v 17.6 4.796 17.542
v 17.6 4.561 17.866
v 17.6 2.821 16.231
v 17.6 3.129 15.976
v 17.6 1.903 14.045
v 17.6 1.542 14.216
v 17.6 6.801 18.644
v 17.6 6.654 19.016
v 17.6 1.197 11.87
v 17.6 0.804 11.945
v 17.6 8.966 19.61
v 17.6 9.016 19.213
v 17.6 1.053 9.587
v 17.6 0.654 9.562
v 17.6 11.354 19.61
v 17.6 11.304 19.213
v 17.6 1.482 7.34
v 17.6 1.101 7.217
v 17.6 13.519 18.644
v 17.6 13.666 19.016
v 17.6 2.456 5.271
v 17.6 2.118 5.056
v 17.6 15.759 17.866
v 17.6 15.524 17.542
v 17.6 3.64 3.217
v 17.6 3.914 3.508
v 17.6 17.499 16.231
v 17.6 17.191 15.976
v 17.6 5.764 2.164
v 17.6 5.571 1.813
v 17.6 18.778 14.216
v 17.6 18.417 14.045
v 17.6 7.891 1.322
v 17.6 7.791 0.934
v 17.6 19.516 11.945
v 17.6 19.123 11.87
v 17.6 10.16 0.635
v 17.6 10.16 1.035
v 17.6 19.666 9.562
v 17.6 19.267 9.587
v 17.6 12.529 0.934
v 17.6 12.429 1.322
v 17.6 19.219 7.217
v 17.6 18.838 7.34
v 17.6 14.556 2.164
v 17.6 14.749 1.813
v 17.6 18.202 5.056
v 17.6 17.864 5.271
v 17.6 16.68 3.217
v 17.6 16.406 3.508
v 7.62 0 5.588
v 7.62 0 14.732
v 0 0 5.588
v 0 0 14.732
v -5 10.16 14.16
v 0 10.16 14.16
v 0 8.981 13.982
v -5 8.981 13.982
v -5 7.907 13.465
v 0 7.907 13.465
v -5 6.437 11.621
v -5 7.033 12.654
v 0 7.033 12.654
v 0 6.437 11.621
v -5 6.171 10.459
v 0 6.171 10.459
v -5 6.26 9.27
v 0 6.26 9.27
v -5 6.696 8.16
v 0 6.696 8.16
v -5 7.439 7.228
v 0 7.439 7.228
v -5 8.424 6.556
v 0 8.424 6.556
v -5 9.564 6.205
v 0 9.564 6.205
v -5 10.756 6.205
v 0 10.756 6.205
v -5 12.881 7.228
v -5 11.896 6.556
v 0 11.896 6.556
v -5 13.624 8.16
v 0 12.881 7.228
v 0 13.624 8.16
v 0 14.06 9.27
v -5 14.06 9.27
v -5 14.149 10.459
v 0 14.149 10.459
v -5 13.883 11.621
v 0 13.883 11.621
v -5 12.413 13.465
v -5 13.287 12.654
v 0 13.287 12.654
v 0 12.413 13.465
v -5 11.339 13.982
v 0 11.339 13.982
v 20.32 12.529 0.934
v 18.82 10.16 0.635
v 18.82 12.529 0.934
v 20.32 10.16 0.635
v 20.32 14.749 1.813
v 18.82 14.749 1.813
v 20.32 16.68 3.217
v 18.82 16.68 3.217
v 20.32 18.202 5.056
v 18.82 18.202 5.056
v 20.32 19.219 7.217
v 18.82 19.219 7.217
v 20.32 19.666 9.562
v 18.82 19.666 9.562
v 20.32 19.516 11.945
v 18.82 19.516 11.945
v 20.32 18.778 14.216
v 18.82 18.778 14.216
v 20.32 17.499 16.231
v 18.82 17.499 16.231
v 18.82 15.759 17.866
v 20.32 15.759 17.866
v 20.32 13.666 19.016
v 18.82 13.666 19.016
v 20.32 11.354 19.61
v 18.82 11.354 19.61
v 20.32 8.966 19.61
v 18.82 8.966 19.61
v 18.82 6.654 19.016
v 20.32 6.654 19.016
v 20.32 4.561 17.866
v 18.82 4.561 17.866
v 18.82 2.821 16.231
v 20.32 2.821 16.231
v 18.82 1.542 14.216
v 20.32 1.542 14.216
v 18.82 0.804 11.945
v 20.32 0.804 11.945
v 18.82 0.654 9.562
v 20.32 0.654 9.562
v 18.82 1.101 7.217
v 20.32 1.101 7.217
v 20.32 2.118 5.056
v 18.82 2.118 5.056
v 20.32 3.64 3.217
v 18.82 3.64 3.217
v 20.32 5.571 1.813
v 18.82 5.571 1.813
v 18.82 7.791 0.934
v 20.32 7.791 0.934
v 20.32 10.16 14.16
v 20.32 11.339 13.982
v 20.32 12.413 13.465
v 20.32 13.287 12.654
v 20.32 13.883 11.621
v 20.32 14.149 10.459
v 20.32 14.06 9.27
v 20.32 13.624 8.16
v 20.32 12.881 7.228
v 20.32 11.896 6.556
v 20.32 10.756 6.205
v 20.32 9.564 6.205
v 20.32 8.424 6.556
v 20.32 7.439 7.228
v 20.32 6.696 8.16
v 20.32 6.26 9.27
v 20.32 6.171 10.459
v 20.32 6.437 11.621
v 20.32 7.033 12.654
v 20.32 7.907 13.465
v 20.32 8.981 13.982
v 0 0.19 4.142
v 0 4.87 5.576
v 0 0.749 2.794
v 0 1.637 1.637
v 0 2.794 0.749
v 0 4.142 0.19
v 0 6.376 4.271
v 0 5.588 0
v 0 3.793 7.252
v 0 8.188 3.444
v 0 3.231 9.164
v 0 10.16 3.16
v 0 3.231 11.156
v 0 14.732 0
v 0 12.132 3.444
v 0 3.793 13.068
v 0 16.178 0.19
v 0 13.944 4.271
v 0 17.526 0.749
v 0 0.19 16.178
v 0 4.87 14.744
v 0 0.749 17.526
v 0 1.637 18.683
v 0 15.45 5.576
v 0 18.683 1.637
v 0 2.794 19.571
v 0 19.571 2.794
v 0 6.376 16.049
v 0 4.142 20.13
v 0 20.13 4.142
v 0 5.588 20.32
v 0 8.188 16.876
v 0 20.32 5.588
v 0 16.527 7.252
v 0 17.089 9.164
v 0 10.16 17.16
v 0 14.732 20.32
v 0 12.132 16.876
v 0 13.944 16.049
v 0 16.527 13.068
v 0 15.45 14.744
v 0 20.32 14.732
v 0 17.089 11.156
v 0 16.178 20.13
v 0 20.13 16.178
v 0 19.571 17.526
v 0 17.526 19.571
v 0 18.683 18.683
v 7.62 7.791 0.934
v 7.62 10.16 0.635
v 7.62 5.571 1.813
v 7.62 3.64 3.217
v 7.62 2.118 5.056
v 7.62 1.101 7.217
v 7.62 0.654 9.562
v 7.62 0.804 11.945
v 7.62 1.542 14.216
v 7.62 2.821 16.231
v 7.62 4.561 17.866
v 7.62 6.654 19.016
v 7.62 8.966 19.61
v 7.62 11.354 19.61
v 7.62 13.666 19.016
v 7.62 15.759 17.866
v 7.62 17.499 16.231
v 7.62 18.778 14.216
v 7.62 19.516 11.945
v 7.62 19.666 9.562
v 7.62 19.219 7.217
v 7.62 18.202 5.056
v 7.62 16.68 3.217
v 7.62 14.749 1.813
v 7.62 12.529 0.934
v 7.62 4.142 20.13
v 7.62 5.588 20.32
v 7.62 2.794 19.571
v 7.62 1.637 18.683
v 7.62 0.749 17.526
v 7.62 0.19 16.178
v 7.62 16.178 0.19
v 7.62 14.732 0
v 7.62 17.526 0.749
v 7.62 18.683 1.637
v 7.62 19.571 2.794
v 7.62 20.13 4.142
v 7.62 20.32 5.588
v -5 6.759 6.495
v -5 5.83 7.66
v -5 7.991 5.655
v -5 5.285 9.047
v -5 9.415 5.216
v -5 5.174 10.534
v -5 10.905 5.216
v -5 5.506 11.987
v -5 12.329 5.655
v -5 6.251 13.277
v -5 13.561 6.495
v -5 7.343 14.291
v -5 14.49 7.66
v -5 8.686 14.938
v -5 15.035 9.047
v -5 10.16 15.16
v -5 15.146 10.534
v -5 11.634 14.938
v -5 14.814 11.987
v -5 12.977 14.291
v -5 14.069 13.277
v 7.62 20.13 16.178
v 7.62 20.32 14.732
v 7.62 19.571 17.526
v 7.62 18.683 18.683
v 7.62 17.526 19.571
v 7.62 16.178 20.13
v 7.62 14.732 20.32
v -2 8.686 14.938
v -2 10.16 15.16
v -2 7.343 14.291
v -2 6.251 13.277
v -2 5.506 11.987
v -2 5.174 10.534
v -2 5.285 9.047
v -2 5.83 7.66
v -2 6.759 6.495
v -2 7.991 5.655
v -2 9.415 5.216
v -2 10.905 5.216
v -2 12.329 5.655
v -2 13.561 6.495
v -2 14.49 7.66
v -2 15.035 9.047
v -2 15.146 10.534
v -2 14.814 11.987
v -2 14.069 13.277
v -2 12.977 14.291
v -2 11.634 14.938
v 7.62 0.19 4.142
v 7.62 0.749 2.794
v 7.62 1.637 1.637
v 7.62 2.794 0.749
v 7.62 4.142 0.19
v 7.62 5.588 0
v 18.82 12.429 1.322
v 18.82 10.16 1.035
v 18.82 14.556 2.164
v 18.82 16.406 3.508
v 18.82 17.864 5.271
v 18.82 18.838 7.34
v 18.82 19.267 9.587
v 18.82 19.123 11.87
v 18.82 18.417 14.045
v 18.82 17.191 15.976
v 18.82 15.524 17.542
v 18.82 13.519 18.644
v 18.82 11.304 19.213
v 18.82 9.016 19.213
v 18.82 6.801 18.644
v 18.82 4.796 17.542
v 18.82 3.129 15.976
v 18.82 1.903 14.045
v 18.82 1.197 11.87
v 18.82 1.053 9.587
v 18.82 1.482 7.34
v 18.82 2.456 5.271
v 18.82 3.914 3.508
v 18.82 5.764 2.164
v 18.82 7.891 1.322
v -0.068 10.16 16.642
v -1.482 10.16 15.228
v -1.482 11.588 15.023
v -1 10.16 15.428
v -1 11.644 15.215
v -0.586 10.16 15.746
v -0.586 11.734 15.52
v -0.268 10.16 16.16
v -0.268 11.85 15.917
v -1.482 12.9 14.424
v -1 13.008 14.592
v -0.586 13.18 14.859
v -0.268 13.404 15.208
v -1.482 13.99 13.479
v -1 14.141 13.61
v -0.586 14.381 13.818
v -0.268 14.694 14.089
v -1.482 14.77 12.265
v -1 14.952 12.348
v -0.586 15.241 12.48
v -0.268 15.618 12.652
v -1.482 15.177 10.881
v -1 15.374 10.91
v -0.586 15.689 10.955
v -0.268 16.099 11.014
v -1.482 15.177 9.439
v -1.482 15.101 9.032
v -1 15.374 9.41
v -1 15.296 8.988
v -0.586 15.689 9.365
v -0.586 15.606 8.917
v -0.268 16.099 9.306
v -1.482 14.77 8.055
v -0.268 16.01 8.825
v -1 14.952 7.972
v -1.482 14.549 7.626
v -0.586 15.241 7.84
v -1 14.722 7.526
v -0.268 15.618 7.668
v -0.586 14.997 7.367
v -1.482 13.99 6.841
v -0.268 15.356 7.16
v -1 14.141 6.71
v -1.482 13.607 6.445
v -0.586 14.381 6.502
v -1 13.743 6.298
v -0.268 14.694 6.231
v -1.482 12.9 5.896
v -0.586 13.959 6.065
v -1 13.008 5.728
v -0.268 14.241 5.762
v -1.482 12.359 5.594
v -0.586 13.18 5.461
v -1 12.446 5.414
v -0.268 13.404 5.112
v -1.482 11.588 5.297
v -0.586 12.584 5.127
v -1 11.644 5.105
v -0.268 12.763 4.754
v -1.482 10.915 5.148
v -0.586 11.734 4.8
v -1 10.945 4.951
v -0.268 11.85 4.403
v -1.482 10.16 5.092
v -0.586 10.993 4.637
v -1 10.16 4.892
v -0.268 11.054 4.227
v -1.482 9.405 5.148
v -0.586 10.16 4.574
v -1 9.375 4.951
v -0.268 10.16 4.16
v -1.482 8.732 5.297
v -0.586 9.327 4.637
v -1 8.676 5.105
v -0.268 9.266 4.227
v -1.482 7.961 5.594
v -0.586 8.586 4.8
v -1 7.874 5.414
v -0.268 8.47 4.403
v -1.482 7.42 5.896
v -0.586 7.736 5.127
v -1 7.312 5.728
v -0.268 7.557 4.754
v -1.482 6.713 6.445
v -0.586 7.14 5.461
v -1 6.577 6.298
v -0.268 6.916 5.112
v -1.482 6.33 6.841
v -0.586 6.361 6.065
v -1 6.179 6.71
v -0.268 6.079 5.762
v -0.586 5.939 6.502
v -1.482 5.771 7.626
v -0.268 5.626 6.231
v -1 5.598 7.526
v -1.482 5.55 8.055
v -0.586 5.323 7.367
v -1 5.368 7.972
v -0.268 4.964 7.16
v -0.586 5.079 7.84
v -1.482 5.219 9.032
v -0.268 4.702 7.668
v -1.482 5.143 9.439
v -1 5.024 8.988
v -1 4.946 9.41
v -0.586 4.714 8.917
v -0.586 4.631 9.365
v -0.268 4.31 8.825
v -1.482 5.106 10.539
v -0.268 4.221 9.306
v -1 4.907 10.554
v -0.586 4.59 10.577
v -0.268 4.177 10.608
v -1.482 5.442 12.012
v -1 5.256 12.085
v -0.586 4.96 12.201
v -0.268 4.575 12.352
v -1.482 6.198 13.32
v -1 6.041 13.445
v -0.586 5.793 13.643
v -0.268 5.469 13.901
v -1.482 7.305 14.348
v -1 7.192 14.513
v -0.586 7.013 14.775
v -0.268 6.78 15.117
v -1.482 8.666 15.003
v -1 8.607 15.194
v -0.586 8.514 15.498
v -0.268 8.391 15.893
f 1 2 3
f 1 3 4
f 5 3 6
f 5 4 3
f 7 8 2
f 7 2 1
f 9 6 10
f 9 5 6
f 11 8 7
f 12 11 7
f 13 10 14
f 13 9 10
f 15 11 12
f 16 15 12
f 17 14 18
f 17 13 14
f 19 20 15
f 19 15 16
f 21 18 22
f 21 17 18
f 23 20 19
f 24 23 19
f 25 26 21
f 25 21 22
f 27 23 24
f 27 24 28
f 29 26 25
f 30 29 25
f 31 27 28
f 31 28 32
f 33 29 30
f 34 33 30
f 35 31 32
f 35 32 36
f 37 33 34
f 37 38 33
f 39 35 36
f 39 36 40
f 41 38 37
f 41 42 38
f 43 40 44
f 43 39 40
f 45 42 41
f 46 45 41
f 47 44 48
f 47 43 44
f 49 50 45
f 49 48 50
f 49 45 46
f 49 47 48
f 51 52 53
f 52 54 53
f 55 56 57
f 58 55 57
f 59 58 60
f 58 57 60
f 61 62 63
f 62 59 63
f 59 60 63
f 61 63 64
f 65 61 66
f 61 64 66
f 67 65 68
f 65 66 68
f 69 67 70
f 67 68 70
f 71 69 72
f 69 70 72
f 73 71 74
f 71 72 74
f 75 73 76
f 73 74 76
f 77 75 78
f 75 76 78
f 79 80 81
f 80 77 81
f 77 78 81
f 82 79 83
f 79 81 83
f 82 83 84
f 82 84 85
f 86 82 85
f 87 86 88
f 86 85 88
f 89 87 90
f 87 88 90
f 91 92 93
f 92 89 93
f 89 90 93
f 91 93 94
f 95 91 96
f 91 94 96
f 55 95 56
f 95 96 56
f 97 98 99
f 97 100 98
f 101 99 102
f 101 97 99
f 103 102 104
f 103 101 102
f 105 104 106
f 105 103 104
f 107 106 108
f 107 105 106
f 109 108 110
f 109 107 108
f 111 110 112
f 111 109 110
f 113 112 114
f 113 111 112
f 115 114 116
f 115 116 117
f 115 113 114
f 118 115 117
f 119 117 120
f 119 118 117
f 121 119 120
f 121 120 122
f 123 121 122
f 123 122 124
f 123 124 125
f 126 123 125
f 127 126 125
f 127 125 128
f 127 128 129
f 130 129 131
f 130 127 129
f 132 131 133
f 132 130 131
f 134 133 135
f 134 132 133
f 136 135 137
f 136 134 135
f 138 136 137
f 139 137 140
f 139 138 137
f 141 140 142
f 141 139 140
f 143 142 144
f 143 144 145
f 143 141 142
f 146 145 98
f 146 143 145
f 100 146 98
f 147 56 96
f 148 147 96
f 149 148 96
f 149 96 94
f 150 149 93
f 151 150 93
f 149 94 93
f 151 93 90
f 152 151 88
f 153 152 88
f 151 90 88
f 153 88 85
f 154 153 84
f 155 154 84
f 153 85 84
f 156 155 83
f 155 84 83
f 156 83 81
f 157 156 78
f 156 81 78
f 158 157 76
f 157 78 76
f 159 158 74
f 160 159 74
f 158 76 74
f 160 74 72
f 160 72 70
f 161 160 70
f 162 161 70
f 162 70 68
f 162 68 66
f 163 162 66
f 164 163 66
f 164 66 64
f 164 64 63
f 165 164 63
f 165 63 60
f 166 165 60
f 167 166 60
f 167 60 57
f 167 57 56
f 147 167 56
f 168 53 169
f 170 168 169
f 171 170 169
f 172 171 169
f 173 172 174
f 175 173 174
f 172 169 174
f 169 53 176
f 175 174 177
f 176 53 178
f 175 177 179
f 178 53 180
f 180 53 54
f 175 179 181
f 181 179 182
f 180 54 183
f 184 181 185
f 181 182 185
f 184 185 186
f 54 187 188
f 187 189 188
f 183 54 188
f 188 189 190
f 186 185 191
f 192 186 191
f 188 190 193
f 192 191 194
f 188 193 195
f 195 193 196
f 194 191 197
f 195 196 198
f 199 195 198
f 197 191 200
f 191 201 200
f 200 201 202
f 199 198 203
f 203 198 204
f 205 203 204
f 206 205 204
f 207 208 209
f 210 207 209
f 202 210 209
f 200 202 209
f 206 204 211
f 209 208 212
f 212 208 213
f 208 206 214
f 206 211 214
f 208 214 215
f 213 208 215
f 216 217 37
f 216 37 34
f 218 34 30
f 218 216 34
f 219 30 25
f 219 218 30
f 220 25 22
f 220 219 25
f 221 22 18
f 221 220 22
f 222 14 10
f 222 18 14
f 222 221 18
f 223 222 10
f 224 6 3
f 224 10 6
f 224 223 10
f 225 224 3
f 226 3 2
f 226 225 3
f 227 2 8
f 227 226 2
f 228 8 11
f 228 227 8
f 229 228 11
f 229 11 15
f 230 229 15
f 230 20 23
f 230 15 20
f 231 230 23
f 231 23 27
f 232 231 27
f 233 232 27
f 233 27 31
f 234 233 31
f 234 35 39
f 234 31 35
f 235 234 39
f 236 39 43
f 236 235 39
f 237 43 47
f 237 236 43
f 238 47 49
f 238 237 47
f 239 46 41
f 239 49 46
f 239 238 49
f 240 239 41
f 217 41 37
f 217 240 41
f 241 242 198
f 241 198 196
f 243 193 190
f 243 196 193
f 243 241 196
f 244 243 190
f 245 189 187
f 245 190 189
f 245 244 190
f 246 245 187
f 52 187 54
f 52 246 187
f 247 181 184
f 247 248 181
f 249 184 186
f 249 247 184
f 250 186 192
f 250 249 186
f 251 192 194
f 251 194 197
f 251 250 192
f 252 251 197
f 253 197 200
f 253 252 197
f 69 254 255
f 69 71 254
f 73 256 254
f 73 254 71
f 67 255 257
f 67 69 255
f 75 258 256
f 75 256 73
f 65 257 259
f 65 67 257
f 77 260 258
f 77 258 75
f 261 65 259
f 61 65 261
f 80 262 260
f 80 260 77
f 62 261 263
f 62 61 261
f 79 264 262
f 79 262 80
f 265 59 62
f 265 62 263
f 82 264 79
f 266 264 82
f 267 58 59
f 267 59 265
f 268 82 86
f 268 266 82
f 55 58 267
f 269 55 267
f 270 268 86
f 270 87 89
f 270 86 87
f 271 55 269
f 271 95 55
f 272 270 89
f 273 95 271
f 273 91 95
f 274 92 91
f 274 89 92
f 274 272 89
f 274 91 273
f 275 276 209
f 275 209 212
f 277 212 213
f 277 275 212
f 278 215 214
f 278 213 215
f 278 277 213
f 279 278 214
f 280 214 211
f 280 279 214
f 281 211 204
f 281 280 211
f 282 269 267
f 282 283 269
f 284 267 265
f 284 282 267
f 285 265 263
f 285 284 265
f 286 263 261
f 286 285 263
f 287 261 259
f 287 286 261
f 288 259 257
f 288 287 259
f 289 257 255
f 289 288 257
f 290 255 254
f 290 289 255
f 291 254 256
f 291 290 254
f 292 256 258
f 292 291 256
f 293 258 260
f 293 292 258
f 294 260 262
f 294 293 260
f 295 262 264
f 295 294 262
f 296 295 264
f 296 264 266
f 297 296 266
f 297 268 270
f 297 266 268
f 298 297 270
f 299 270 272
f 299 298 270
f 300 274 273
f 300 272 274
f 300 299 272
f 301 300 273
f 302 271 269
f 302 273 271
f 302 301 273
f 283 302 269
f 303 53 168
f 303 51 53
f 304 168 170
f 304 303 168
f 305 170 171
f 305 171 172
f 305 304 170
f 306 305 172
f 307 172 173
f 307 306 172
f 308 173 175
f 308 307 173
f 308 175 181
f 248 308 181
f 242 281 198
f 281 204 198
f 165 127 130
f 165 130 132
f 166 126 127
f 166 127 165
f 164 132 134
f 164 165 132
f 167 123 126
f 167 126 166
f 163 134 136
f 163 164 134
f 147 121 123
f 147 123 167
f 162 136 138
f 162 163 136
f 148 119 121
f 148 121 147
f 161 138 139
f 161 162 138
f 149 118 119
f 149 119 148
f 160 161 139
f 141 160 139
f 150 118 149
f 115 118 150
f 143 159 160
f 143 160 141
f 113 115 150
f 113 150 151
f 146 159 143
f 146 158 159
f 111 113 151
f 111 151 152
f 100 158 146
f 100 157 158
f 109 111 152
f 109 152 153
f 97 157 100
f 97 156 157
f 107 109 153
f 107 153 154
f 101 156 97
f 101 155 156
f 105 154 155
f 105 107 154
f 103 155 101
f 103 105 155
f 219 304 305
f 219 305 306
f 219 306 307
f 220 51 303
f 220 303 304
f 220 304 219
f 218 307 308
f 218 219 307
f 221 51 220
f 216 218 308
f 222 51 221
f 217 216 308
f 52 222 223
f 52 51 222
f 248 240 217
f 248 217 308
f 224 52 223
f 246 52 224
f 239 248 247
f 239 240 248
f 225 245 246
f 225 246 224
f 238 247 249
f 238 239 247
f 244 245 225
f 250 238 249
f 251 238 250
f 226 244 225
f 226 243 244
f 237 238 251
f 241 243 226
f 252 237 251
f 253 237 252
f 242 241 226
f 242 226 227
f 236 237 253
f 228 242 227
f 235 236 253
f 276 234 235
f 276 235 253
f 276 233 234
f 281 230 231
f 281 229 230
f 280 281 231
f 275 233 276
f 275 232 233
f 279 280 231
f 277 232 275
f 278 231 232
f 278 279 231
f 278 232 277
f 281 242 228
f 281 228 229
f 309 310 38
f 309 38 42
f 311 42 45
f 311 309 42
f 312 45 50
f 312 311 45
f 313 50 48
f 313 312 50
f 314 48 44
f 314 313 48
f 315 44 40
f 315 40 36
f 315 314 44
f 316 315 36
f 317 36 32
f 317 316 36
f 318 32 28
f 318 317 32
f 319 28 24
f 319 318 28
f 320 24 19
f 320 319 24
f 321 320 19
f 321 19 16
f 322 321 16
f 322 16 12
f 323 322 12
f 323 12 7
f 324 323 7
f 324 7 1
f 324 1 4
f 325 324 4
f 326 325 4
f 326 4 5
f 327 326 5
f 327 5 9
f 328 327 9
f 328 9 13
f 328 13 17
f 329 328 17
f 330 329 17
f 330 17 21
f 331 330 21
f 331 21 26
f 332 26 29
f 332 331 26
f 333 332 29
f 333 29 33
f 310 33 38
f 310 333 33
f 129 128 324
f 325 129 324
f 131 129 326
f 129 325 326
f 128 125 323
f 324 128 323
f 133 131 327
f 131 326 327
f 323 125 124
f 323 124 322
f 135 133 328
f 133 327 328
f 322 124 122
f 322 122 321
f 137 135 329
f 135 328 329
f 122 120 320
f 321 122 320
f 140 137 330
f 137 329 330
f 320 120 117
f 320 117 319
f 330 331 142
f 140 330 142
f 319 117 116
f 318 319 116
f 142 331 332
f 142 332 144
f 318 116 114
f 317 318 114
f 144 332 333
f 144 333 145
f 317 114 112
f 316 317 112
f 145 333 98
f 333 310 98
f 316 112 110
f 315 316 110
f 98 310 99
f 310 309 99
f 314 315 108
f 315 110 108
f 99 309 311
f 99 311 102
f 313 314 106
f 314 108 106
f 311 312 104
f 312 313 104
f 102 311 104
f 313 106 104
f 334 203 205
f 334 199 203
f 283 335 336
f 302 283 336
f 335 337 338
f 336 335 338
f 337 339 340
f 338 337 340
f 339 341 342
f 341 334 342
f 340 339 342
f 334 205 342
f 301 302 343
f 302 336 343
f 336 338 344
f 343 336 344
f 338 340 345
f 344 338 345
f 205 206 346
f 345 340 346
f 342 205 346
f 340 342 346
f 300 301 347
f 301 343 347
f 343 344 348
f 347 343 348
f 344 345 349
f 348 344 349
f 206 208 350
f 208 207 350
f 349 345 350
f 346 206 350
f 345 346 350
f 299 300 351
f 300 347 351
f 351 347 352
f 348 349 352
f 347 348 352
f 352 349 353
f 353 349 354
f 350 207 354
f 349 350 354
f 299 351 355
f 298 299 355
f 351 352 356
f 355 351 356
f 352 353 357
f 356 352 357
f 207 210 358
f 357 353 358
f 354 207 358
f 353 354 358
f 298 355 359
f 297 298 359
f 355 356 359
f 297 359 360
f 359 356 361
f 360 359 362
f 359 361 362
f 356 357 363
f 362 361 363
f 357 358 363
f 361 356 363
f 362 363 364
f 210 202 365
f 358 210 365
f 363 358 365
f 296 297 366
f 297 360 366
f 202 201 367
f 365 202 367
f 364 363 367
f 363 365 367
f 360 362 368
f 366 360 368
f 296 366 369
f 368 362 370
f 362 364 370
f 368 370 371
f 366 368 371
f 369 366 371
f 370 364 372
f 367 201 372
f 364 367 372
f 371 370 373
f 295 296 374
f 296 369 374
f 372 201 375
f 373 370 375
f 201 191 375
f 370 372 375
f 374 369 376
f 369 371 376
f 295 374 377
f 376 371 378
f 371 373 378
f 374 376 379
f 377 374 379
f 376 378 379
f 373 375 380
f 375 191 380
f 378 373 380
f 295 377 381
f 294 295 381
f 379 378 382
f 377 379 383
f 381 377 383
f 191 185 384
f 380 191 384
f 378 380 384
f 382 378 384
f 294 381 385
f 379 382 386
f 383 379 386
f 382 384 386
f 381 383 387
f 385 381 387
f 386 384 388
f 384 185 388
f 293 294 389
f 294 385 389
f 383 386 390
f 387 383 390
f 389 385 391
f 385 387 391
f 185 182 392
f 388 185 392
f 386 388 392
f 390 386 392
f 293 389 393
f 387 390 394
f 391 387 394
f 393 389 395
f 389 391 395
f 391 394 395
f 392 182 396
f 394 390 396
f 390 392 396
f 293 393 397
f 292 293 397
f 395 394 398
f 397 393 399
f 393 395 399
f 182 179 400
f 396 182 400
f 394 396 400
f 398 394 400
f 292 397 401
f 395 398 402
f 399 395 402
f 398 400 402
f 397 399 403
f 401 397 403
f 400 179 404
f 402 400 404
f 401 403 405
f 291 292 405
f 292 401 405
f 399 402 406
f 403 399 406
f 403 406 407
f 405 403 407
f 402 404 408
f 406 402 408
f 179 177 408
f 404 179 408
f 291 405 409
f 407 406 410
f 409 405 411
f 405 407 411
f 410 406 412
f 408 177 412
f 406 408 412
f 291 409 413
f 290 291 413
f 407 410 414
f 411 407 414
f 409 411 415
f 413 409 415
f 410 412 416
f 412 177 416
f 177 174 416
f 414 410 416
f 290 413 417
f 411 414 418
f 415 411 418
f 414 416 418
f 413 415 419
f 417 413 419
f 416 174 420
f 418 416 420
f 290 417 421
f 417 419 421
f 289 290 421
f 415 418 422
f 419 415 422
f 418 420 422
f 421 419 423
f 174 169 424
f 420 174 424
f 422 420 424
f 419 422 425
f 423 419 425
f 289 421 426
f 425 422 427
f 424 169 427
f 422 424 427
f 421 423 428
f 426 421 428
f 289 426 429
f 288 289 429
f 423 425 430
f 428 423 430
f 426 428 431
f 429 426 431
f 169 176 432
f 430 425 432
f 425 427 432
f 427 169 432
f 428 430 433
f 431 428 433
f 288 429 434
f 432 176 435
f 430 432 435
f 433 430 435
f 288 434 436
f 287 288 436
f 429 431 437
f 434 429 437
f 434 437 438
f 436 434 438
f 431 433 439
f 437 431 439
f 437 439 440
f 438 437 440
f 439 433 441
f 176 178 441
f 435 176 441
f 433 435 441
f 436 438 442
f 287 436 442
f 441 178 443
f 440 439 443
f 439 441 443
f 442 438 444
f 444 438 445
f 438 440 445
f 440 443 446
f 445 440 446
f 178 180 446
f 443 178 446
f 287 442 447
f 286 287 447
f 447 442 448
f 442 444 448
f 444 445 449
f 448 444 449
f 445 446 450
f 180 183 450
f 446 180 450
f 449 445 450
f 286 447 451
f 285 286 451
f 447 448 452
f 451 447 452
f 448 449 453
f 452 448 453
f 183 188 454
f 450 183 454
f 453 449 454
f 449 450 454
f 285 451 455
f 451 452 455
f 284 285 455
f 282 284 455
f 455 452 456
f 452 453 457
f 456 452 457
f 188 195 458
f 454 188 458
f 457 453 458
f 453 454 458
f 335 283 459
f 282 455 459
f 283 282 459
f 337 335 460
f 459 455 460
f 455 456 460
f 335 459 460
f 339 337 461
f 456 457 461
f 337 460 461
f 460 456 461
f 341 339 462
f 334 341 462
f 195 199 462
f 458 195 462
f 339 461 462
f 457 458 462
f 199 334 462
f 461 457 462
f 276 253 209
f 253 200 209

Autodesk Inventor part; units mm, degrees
ref_plane "YZ Plane" through (0, 0, 0) normal (1, 0, 0) x (0, 1, 0)
ref_plane "XZ Plane" through (0, 0, 0) normal (0, 1, 0) x (-1, 0, 0)
ref_plane "XY Plane" through (0, 0, 0) normal (0, 0, 1) x (1, 0, 0)
sketch "Sketch1" plane through (0, 0, 0) normal (1, 0, 0) x (0, 1, 0)
  line L0 (0, 0) -> (20.32, 0)
  line L1 (20.32, 0) -> (20.32, 20.32)
  line L2 (20.32, 20.32) -> (0, 20.32)
  line L3 (0, 20.32) -> (0, 0)
  dimension "d0" = 20.32
  dimension "d1" = 20.32
extrude "Extrusion1" add sketch "Sketch1" along normal blind 7.62
sketch "Sketch2" plane through (7.62, 0, 0) normal (1, 0, 0) x (0, 0, -1)
  circle A0 centre (-10.16, 10.16) radius 9.525
  point P0 (0, 0)
  dimension "d4" = 19.05
extrude "Extrusion2" add sketch "Sketch2" along normal blind 12.7
fillet "Fillet1" radius 5.588 4 edges at (3.81, 20.32, 0) (3.81, 0, 0) (3.81, 0, 20.32) (3.81, 20.32, 20.32)
sketch "Sketch3" plane through (20.32, 10.16, 10.16) normal (1, 0, 0) x (0, 0, -1)
  circle A0 centre (0, 0) radius 9.525
  circle A1 centre (0, 0) radius 9.125
  point P0 (10.16, -10.16)
  dimension "d8" = 18.25
extrude "Extrusion3" cut sketch "Sketch3" against normal blind 2.72
sketch "Sketch4" plane through (20.32, 10.16, 10.16) normal (1, 0, 0) x (0, 0, -1)
  circle A0 centre (0, 0) radius 9.525
  point P0 (10.16, -10.16)
extrude "Extrusion4" add sketch "Sketch4" against normal blind 1.5
sketch "Sketch5" plane through (0, 0, 0) normal (-1, 0, 0) x (0, 0, 1)
  circle A0 centre (10.16, 10.16) radius 9.125 projected
  circle A1 centre (10.16, 10.16) radius 4
  point P0 (0, 0)
  dimension "d13" = 8
extrude "Extrusion5" cut sketch "Sketch5" against normal blind 25 contours A1
sketch "Sketch6" plane through (0, 0, 0) normal (-1, 0, 0) x (0, 0, 1)
  circle A0 centre (10.16, 10.16) radius 4 projected
  circle A1 centre (10.16, 10.16) radius 4
  circle A2 centre (10.16, 10.16) radius 5
  point P0 (0, 0)
  dimension "d16" = 10
extrude "Extrusion6" add sketch "Sketch6" along normal blind 5
fillet "Fillet2" radius 2 1 edges at (0, 10.16, 5.16)
properties part number "_3DPrint"
